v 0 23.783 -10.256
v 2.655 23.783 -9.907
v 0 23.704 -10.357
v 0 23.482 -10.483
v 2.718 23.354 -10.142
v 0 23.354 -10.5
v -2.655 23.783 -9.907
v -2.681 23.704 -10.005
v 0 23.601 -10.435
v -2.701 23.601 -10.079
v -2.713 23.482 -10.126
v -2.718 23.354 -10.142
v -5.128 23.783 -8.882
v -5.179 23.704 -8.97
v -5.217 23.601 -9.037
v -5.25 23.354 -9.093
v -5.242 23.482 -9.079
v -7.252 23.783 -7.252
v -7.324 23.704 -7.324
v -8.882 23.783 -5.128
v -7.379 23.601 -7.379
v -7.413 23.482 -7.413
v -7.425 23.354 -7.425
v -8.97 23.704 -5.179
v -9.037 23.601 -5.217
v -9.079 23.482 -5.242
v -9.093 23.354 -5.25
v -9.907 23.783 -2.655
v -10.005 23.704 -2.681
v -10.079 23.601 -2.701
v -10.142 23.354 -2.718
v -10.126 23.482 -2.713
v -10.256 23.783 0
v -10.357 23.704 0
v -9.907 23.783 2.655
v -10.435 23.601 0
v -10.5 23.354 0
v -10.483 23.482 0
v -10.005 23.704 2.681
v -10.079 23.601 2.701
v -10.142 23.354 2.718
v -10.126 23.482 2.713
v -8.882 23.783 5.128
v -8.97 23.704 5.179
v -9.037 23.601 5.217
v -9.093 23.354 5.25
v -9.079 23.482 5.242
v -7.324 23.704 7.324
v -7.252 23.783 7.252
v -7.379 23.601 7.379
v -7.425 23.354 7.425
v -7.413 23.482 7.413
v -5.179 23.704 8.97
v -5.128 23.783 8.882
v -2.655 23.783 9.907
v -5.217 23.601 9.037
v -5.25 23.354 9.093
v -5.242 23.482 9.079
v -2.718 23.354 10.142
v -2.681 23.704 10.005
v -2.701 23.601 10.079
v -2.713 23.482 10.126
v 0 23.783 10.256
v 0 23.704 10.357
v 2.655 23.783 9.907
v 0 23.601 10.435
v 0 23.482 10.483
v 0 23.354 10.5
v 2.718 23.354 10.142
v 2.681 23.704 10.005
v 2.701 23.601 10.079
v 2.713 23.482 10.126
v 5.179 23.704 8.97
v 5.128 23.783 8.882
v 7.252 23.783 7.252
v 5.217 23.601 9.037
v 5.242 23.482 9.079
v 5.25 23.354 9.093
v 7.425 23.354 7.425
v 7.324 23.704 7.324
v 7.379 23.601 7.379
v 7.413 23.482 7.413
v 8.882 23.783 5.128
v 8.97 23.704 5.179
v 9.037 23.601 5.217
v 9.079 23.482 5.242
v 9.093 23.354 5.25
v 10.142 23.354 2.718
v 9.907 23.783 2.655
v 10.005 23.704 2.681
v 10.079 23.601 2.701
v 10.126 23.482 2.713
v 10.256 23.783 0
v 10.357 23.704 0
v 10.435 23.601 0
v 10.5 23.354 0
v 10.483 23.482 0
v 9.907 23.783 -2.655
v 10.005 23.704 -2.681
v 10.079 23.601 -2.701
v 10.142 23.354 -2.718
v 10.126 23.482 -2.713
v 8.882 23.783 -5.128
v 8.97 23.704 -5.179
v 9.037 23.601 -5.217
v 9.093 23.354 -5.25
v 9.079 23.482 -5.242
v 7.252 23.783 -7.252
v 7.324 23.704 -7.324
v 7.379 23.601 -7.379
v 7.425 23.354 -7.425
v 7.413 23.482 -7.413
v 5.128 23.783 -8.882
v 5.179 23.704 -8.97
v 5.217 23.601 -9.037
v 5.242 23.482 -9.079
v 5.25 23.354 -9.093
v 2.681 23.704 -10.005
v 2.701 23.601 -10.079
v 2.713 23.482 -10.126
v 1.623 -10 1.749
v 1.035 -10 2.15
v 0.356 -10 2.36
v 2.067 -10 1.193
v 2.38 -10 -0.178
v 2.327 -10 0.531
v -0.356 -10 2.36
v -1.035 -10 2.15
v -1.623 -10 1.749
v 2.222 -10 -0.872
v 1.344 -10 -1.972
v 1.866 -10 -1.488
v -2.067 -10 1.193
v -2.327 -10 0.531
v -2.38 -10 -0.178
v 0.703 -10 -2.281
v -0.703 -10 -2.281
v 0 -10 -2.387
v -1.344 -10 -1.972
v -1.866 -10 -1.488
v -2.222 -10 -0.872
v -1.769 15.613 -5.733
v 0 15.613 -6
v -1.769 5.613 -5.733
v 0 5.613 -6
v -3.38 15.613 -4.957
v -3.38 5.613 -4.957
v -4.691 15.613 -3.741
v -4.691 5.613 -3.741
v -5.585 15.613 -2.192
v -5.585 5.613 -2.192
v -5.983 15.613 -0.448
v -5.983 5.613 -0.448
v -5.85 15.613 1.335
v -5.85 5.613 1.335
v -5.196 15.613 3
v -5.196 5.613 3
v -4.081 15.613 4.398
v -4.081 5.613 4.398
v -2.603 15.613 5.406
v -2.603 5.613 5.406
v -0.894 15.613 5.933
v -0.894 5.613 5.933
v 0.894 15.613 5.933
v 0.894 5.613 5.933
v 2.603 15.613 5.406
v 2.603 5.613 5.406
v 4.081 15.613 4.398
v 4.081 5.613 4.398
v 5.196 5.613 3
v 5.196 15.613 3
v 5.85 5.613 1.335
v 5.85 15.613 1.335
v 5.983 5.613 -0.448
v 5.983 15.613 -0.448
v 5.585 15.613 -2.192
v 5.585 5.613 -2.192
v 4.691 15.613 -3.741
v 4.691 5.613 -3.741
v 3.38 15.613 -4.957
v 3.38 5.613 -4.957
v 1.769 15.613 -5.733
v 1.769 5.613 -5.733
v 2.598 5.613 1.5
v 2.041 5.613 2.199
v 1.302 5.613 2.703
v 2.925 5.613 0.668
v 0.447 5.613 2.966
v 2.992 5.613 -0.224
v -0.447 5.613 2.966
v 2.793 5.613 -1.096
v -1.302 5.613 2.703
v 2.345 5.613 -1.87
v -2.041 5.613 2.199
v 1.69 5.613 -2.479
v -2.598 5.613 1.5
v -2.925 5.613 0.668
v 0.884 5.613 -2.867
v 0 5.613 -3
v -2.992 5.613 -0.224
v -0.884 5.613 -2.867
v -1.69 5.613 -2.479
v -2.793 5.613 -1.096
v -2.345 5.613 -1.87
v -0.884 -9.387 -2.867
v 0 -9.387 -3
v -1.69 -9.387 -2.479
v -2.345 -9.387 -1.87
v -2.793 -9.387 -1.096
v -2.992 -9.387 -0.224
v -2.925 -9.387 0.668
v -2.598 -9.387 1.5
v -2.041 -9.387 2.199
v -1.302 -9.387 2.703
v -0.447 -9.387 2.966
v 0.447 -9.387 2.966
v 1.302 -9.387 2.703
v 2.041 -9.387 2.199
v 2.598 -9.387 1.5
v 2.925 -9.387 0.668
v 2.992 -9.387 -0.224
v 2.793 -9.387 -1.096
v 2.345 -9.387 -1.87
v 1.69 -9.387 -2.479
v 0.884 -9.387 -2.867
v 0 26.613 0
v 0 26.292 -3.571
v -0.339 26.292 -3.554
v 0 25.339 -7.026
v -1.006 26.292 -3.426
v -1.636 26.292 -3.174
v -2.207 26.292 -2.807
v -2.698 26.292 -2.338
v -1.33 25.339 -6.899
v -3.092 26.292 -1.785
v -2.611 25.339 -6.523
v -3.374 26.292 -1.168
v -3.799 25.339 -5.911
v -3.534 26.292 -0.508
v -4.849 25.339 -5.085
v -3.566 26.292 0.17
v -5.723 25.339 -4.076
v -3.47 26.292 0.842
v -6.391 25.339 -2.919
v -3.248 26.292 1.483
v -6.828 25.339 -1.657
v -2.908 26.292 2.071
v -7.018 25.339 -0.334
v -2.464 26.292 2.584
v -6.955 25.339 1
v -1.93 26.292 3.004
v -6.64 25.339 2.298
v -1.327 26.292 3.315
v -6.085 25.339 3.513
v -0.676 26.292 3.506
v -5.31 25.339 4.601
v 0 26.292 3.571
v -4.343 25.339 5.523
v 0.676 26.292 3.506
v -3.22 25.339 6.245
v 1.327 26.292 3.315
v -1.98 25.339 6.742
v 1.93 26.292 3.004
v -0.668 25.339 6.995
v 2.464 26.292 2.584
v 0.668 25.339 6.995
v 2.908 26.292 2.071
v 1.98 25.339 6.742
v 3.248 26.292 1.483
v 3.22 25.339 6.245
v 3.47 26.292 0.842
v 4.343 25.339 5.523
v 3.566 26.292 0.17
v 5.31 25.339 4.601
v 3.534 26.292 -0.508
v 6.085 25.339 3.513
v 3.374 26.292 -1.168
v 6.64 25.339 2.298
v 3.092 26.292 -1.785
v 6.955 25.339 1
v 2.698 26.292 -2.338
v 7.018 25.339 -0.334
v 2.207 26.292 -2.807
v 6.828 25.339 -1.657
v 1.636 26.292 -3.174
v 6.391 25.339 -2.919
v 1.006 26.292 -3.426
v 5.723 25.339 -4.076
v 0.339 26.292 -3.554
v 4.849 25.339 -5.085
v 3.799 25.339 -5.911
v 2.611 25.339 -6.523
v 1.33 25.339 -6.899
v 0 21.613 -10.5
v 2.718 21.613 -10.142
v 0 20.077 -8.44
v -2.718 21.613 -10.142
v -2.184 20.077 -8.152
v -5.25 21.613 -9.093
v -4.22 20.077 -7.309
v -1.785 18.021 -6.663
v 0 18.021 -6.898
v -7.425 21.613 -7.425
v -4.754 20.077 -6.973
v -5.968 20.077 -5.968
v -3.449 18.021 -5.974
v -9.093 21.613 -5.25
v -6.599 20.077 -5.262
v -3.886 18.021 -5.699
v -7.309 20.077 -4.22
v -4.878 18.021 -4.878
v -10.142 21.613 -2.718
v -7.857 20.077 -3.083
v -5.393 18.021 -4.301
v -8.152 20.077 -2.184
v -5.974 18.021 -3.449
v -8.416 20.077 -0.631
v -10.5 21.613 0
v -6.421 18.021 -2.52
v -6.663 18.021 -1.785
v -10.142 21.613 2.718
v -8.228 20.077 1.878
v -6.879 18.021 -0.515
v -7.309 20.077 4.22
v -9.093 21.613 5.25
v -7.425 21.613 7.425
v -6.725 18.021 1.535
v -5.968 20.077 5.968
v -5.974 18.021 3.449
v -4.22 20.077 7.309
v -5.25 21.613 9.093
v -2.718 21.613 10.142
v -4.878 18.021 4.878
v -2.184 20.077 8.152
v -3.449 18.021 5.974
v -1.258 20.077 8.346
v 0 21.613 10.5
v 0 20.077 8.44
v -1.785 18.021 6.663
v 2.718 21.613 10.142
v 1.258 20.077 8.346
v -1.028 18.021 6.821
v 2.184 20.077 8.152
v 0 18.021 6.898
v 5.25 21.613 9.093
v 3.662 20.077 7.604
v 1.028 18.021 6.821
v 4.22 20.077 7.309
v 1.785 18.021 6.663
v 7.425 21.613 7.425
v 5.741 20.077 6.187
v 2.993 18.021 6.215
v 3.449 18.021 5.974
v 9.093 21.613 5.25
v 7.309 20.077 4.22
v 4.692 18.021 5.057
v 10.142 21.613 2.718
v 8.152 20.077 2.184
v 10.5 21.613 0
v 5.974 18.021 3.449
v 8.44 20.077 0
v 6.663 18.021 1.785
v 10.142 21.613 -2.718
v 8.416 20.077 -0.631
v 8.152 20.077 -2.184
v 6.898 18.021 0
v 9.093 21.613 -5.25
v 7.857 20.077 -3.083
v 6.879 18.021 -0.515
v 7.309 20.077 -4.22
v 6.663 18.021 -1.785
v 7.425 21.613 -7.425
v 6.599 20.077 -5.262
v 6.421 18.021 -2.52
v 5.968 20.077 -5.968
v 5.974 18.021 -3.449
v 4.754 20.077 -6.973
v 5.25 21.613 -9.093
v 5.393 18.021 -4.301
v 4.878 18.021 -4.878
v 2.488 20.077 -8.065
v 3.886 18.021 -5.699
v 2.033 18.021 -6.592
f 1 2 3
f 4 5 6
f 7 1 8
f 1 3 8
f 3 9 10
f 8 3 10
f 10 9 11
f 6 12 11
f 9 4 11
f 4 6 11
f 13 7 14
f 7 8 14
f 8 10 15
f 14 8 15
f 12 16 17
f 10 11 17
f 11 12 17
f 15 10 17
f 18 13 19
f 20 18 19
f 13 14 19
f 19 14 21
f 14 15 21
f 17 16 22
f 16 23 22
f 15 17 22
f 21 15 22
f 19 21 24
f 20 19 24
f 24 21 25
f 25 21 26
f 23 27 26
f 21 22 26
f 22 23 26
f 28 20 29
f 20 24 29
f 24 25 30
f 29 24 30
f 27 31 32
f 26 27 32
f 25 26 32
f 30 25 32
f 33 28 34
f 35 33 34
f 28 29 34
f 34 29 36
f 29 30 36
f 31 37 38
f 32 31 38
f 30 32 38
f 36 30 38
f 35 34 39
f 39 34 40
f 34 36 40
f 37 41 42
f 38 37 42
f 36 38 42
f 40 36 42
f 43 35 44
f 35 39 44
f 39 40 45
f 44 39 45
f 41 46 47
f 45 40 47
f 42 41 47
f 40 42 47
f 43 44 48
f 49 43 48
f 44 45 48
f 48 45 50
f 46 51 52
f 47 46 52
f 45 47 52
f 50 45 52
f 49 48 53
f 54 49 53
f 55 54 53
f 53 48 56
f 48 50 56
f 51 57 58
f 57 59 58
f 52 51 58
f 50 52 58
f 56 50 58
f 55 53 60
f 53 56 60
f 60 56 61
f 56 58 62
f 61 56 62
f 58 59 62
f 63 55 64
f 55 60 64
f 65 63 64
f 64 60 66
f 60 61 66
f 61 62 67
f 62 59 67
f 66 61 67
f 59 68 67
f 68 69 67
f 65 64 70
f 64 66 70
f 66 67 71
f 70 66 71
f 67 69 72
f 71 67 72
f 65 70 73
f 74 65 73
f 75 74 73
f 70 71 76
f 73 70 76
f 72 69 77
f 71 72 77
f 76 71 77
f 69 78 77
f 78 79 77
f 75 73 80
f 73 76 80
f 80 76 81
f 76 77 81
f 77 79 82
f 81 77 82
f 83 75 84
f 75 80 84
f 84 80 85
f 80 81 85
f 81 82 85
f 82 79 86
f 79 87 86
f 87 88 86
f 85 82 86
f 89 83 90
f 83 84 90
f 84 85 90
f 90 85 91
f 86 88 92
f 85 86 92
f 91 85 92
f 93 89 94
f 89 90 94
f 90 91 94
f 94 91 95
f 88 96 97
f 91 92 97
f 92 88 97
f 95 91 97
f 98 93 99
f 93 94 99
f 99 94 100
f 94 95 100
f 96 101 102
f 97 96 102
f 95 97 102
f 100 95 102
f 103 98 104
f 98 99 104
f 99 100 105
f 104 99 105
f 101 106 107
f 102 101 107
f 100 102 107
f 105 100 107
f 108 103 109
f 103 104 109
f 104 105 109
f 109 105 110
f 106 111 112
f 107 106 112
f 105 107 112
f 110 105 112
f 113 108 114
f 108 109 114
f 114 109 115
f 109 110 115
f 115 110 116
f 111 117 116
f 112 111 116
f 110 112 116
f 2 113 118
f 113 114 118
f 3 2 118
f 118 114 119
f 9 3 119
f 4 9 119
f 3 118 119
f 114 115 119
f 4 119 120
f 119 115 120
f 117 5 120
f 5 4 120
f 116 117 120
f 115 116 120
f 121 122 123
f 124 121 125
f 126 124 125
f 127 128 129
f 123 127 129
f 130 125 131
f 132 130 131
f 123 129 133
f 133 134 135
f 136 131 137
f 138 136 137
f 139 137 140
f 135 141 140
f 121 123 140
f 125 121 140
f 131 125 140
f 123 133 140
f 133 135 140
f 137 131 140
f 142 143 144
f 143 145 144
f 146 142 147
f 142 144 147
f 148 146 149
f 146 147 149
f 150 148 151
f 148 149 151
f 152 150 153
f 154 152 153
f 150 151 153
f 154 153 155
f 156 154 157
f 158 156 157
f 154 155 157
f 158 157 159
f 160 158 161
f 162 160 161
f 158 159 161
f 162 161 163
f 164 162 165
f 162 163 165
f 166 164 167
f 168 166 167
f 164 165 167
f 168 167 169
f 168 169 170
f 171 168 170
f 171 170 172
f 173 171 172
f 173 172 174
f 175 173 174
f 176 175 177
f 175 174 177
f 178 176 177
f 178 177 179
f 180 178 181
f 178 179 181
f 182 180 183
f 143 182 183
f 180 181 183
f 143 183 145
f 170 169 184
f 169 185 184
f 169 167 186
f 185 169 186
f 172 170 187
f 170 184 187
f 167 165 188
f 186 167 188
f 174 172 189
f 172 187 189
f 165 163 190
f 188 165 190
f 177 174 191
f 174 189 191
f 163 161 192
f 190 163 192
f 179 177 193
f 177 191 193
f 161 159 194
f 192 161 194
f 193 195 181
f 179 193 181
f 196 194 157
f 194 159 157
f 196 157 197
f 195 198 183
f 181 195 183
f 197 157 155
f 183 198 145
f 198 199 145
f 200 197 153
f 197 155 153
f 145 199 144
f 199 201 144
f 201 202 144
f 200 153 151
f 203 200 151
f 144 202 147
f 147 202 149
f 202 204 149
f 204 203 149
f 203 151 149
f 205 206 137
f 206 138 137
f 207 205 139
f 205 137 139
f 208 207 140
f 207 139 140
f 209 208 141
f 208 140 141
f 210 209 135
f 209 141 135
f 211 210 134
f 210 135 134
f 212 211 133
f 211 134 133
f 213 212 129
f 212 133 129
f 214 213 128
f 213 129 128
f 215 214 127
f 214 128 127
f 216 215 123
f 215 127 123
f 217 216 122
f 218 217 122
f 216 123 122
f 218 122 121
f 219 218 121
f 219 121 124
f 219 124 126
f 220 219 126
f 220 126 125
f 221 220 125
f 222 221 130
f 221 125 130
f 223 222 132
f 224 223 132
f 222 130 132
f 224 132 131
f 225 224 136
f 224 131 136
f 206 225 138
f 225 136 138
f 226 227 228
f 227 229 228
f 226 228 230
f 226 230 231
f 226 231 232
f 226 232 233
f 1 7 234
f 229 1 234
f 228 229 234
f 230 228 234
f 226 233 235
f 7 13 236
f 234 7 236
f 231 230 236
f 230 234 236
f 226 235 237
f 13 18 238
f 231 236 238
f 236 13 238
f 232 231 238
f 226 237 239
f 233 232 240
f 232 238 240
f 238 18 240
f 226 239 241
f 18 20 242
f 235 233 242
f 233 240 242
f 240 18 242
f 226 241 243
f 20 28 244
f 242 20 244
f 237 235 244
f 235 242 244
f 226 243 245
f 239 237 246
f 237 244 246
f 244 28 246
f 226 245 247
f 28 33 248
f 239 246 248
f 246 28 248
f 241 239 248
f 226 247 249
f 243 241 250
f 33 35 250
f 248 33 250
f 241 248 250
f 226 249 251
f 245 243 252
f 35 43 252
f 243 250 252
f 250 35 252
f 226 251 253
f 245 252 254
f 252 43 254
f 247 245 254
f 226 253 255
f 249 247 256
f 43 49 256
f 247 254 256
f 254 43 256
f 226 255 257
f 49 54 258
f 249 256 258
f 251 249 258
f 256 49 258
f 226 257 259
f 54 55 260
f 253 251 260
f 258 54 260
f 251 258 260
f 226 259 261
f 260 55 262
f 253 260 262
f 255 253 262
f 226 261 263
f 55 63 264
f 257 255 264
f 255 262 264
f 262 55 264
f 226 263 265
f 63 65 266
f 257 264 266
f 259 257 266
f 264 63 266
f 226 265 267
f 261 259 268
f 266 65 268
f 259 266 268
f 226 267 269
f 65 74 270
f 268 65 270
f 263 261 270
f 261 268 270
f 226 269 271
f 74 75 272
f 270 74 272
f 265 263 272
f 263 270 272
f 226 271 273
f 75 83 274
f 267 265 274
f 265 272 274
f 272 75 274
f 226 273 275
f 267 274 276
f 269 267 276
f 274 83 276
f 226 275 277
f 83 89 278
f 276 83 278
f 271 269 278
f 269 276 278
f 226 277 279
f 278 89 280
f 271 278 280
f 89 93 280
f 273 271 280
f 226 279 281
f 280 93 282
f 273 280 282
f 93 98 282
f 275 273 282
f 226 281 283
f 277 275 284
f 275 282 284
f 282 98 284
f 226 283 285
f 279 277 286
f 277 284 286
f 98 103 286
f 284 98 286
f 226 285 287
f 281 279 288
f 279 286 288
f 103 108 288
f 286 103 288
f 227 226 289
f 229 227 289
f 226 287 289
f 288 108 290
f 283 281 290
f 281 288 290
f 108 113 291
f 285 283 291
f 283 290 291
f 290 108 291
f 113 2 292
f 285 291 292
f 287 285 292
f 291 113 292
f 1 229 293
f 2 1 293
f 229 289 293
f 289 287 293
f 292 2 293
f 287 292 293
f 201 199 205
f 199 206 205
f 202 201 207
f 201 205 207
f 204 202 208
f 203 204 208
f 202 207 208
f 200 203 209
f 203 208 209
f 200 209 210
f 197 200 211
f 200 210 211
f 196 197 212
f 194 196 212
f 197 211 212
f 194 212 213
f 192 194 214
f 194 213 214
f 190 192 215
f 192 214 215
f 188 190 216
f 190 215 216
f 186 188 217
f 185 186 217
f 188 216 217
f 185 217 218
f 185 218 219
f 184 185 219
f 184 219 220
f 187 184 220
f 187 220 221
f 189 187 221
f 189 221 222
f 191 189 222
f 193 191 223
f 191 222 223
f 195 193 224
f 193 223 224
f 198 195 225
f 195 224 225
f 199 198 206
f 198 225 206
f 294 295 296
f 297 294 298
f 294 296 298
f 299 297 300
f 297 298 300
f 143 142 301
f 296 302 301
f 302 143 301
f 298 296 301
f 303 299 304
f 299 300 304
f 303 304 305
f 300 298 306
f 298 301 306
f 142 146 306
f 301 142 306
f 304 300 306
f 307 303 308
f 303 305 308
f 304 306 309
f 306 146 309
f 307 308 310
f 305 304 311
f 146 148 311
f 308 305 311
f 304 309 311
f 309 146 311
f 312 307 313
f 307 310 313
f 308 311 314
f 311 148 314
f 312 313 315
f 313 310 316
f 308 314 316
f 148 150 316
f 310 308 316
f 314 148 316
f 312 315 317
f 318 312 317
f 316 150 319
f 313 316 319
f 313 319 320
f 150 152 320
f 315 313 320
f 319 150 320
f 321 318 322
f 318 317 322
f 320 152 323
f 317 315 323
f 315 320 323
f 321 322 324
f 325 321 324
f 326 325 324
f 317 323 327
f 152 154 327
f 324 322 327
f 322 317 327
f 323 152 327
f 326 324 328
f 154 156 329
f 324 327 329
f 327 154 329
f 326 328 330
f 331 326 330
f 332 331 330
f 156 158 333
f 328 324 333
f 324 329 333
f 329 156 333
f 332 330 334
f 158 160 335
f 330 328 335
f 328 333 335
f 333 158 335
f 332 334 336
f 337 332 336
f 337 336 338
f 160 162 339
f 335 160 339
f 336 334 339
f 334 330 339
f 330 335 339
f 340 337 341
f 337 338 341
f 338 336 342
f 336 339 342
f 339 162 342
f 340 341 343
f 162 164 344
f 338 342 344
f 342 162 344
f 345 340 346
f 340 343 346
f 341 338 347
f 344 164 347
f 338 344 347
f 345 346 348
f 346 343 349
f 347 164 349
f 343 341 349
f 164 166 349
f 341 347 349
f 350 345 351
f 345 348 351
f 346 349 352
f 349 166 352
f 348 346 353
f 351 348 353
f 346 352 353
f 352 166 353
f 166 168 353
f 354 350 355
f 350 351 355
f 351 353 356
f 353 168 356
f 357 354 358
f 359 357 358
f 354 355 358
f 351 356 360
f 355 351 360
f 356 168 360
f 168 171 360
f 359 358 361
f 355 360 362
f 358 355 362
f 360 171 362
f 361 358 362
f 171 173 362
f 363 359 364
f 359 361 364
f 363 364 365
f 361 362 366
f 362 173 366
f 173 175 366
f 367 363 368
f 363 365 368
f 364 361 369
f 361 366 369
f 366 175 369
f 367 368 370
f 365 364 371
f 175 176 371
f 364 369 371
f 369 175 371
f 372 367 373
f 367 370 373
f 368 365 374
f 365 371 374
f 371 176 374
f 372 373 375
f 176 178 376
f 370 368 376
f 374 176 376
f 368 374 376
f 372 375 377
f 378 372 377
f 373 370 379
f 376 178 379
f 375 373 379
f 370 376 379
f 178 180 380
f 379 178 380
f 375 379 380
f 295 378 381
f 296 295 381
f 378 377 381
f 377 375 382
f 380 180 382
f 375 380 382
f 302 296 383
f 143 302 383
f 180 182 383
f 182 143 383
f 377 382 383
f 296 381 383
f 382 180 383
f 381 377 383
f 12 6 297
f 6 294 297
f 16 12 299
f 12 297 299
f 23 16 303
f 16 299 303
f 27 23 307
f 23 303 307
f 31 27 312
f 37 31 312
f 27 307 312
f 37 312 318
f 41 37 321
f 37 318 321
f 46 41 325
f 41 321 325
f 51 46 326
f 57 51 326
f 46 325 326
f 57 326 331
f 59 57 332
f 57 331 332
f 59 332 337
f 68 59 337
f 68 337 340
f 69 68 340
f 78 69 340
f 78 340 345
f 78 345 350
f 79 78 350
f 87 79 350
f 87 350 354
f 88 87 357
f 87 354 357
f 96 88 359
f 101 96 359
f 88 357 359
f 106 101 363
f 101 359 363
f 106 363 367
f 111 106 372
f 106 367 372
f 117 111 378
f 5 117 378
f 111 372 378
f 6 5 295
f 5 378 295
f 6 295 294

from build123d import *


with BuildPart() as part:
    # Esquisse1 → Révolution1 (revolve)
    with BuildSketch(Plane(origin=(0, 0, 0), x_dir=(0, 0, -1), z_dir=(1, 0, 0))):
        with BuildLine():
            Line((10.5, 23.354104043), (10.5, 21.613435))
            ThreePointArc((10.5, 21.613435), (7.595227269, 19.104514548), (6, 15.613435))
            Line((6, 15.613435), (6, 5.613435))
            Line((6, 5.613435), (3, 5.613435))
            Line((3, 5.613435), (3, -9.386565))
            Line((3, -9.386565), (2.386565, -10))
            Line((2.386565, -10), (0, -10))
            Line((0, -10), (0, 26.613435))
            ThreePointArc((0, 26.613435), (5.319852473, 25.892936282), (10.256410256, 23.783351967))
            ThreePointArc((10.256410256, 23.783351967), (10.434859246, 23.600878101), (10.5, 23.354104043))
        make_face()
    revolve(axis=Axis((0, -10, 0), (0, 1, 0)))


solid = part.part
